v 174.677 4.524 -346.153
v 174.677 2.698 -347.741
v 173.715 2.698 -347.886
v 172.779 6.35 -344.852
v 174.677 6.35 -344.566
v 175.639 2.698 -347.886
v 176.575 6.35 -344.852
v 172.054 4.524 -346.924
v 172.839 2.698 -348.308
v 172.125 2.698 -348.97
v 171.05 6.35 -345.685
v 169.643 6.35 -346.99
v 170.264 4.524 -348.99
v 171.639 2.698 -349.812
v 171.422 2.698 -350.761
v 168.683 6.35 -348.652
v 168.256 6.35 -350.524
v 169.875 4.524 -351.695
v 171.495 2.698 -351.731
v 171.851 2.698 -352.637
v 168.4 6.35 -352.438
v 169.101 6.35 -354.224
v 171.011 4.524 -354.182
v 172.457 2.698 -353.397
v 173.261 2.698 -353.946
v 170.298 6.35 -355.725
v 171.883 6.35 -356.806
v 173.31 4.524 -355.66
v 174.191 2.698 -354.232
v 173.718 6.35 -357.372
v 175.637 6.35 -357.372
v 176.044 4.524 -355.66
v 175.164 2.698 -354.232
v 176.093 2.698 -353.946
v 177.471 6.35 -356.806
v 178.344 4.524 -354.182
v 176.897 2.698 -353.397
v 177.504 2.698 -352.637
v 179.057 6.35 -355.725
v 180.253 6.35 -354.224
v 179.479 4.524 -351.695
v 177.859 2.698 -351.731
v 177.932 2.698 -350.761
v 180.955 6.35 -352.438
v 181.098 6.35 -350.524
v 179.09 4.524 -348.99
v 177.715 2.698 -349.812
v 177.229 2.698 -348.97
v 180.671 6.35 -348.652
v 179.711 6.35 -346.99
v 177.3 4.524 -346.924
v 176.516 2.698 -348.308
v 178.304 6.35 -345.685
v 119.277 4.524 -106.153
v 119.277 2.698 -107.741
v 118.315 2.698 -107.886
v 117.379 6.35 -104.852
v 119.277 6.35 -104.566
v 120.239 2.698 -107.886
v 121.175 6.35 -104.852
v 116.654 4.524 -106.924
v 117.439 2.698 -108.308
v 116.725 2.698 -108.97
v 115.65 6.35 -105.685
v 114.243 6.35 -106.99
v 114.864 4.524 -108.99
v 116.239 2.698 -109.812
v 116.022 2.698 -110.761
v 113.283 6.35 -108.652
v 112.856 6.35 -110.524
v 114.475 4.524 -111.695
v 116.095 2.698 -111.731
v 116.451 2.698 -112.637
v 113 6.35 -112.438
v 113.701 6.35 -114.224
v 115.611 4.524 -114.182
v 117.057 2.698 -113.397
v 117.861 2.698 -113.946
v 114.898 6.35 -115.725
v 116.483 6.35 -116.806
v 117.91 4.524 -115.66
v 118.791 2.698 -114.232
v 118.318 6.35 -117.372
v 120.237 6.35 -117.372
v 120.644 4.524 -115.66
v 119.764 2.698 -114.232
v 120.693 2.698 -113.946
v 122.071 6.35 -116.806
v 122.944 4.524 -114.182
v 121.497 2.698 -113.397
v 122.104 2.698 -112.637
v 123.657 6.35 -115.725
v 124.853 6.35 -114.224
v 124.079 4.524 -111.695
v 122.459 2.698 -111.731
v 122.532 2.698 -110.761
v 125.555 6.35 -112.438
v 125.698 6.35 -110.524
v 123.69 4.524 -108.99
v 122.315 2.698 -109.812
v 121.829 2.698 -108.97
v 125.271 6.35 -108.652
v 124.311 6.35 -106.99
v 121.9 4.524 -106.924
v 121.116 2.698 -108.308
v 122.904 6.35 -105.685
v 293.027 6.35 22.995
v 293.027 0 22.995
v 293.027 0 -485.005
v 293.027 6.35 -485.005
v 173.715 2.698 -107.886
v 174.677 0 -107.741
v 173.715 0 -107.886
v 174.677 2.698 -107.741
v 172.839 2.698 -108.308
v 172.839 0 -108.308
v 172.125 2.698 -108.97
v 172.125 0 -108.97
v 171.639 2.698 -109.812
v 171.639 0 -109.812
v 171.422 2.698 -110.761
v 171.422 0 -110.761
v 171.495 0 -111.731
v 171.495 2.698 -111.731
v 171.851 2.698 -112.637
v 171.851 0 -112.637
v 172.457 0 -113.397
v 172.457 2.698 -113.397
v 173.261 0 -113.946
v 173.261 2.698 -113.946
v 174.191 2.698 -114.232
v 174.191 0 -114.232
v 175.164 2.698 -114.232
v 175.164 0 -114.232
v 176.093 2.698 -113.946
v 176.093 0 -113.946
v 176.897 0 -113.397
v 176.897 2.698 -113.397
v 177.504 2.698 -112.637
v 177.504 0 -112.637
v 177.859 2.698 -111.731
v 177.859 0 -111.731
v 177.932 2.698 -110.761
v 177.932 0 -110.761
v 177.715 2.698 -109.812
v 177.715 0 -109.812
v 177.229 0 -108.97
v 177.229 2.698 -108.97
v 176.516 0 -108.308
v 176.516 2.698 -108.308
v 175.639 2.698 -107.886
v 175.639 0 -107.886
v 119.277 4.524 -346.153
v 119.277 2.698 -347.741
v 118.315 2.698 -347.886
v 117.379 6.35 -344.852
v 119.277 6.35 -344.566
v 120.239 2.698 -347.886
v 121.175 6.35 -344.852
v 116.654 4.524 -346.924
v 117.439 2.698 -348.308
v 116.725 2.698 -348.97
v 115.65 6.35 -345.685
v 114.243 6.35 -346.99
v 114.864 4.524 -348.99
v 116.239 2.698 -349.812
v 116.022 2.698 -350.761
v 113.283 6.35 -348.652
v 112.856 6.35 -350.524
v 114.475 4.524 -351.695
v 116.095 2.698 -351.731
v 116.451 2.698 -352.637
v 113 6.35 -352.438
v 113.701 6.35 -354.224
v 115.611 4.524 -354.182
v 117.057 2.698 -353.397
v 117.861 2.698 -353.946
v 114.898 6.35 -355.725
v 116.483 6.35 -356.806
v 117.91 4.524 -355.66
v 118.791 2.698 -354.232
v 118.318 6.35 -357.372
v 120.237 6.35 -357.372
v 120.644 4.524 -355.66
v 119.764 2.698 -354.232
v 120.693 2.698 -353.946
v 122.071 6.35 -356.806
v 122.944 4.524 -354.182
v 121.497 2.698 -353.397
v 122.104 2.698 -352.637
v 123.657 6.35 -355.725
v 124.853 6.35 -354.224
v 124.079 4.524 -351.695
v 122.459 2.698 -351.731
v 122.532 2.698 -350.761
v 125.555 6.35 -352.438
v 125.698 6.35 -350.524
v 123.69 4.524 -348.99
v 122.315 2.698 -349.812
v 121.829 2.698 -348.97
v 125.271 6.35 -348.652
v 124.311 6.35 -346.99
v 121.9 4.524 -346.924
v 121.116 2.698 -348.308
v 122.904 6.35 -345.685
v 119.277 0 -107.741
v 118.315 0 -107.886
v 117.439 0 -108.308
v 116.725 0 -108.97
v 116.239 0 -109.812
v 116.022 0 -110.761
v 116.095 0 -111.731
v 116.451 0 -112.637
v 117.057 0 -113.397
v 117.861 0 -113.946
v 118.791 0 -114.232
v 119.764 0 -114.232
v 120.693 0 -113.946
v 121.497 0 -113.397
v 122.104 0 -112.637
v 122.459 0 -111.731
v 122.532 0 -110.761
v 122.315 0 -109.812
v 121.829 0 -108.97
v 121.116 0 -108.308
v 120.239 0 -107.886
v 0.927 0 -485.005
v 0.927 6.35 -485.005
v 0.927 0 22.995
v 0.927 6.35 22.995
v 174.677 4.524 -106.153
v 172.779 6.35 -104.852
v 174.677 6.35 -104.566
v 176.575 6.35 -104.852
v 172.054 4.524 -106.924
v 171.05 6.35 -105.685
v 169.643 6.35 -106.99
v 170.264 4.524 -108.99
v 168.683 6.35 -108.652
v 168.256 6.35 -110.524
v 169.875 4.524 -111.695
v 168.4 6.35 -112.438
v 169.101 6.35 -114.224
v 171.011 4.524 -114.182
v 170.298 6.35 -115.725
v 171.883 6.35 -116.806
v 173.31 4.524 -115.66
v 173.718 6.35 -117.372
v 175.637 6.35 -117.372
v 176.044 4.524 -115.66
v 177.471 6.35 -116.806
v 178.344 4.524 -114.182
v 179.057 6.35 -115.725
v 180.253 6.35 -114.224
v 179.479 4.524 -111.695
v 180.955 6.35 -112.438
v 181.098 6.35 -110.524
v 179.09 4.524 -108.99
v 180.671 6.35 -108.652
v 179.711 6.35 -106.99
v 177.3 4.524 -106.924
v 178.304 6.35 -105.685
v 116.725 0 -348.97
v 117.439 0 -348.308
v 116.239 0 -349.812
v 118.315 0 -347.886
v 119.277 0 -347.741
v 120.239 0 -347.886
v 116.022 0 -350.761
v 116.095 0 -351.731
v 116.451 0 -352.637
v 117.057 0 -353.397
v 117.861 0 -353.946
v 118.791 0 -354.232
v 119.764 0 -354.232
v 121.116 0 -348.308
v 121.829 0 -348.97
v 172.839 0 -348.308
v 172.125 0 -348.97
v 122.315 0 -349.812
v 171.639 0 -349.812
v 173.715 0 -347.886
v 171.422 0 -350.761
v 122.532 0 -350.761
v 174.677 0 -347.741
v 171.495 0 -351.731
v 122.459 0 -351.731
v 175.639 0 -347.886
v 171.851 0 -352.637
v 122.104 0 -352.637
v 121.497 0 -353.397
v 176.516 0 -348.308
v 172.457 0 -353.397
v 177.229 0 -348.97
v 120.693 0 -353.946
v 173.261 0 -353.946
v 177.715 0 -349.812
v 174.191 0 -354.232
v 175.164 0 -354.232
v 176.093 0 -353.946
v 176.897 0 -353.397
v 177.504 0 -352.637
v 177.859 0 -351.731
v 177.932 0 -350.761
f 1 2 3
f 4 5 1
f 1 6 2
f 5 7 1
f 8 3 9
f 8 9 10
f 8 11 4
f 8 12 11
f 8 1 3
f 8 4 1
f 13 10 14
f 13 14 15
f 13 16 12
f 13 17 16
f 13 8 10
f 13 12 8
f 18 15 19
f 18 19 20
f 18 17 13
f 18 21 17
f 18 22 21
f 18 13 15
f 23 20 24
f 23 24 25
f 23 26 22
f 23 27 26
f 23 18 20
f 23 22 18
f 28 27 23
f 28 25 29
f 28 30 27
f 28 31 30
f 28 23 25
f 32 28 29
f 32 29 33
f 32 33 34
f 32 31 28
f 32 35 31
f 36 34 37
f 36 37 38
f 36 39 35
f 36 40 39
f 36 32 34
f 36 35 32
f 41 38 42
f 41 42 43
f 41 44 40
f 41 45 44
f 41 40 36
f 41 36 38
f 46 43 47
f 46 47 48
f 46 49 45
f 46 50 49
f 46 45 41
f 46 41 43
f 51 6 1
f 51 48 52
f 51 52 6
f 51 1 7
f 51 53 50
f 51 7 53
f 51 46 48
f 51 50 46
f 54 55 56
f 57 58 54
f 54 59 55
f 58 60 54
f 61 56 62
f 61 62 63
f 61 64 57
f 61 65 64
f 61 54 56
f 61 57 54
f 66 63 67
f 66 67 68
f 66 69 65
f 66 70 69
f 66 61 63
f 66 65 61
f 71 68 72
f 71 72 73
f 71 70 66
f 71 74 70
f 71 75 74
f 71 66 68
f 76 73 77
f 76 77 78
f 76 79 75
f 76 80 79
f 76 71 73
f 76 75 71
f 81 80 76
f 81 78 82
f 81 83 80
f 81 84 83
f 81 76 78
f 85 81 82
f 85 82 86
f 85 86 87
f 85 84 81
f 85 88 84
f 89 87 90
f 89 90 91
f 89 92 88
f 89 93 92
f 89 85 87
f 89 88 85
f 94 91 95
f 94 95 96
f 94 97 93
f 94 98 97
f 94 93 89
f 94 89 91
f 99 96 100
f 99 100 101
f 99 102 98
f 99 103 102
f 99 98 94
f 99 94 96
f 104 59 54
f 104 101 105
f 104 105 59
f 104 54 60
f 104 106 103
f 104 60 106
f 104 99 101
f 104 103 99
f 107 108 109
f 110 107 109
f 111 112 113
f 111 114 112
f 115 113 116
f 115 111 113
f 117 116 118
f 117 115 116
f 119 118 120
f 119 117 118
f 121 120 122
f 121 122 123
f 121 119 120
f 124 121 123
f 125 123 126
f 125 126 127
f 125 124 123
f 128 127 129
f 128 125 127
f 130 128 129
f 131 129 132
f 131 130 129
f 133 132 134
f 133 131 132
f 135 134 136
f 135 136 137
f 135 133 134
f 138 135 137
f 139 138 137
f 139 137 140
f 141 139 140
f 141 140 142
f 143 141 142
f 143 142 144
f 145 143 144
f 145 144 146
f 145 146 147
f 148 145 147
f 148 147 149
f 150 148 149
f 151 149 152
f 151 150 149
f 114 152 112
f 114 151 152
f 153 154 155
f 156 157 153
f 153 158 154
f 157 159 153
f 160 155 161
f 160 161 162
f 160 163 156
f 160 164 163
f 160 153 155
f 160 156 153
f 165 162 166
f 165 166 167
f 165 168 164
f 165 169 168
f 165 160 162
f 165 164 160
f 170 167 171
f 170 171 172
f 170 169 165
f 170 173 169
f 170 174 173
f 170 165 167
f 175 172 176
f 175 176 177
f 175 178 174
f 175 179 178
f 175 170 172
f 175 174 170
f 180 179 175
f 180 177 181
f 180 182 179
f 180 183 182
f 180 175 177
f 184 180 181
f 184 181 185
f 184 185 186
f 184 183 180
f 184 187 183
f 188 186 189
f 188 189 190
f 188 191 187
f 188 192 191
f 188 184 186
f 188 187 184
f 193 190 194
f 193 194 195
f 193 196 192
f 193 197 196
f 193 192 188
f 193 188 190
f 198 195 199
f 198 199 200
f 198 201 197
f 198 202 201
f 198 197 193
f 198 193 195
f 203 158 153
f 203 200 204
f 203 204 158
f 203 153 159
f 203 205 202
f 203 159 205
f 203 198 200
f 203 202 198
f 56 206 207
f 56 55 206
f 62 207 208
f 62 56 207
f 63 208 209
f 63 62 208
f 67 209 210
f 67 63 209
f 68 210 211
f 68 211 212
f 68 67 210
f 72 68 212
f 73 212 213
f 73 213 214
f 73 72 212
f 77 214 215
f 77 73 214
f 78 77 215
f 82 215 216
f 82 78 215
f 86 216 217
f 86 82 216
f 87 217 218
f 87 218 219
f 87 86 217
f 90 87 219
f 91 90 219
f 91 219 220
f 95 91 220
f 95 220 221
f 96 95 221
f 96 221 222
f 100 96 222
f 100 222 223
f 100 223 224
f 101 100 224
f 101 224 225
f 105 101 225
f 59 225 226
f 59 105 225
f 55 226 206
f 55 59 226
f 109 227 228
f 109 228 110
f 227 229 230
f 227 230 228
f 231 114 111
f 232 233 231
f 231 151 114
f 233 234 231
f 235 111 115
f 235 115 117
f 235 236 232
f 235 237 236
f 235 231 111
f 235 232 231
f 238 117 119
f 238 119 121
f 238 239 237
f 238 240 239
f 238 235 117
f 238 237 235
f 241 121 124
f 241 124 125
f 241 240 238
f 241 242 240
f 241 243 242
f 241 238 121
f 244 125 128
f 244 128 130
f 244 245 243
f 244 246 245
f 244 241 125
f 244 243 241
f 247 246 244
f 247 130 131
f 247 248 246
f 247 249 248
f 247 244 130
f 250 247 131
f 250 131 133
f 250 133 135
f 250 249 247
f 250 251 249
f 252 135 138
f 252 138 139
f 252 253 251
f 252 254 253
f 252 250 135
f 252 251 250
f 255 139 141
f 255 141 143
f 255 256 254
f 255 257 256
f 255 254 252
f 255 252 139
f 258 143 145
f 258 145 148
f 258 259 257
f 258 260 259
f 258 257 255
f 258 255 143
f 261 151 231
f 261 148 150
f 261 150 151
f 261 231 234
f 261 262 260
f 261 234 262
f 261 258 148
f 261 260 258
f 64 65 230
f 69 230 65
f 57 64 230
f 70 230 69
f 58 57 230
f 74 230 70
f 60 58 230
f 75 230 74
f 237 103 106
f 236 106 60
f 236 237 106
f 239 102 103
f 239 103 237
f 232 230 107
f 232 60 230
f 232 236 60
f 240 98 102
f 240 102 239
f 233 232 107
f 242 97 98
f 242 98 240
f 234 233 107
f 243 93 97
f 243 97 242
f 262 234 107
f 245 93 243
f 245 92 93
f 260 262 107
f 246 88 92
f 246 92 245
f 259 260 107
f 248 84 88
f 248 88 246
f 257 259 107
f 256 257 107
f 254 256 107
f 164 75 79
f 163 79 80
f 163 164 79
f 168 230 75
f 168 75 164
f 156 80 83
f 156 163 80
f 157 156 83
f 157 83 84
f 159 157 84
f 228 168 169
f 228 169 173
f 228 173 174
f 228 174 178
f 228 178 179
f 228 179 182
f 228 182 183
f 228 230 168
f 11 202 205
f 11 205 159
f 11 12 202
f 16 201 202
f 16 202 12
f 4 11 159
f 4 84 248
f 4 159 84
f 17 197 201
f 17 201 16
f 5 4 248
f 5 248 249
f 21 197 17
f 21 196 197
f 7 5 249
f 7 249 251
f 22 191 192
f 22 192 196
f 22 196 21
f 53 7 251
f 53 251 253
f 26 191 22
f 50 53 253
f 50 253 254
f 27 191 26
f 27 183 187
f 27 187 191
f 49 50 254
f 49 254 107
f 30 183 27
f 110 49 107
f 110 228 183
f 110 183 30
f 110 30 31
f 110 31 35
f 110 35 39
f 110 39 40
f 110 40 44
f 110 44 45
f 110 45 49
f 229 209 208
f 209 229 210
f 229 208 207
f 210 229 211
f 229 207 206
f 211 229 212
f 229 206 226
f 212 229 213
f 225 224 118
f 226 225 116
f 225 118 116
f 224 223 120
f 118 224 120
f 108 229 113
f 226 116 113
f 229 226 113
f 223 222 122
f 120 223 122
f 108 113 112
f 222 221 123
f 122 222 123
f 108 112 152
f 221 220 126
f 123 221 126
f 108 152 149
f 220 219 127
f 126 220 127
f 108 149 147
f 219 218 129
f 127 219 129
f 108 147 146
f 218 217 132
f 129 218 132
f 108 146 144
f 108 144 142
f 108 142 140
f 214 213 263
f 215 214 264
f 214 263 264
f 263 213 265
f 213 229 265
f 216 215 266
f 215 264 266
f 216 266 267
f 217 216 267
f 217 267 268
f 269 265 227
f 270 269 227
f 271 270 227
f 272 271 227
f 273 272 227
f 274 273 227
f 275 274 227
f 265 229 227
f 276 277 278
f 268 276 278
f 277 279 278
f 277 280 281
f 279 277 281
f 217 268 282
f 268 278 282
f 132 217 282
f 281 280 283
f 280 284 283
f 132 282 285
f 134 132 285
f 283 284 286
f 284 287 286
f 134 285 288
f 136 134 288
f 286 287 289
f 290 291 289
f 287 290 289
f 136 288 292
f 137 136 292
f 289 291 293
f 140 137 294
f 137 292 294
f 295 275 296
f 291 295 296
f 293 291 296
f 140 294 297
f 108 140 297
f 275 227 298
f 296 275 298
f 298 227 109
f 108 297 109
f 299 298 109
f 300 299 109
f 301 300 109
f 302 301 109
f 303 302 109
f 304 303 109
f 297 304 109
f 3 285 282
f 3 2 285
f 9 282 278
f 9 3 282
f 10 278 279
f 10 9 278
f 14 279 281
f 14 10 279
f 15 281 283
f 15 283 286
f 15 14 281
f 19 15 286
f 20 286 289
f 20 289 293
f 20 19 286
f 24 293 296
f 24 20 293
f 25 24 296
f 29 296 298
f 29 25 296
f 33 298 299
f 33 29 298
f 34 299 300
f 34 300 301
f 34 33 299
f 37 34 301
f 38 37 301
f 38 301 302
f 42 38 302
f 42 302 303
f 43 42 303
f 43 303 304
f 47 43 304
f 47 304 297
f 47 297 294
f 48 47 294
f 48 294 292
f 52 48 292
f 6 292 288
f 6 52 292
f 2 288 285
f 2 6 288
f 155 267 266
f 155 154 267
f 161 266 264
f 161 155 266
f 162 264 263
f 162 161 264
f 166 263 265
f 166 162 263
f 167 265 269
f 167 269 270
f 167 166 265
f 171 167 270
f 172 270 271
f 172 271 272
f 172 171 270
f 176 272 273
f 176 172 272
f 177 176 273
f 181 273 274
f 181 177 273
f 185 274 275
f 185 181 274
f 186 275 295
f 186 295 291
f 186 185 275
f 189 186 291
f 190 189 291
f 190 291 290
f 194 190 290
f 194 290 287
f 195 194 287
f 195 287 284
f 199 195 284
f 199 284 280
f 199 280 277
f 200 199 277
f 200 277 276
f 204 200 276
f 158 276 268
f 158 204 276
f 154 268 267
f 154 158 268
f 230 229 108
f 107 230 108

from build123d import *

# Parameters (mm, degrees)
SKETCH1_W                                     = 292.1
SKETCH1_H                                     = 508
BOSS_EXTRUDE1_DEPTH                           = 6.35
CSK_FOR_1_4_FLAT_HEAD_MACHINE_SCREW1_AT_COUNT = 2
CSK_FOR_1_4_FLAT_HEAD_MACHINE_SCREW1_AT_PITCH = 55.4
CSK_FOR_1_4_FLAT_HEAD_MACHINE_SCREW1_2_COUNT  = 2
CSK_FOR_1_4_FLAT_HEAD_MACHINE_SCREW1_2_PITCH  = 246.311104094
CSK_FOR_1_4_FLAT_HEAD_MACHINE_SCREW1_3_COUNT  = 2
CSK_FOR_1_4_FLAT_HEAD_MACHINE_SCREW1_3_PITCH  = 240


with BuildPart() as part:
    # Sketch1 → Boss-Extrude1 (new body)
    with BuildSketch(Plane(origin=(0, 0, 0), x_dir=(1, 0, 0), z_dir=(0, 1, 0))):
        with Locations((146.977170591, 231.004856512)):
            Rectangle(SKETCH1_W, SKETCH1_H)
    extrude(amount=BOSS_EXTRUDE1_DEPTH)

    # Sketch6 → CSK for 1/4 Flat Head Machine Screw1 (revolve, cut)
    with BuildSketch(Plane(origin=(119.277170591, 6.35, -351.004856512), x_dir=(0, 0, 1), z_dir=(1, 0, 0))):
        Polygon((0, 0), (0, 6.35), (3.2639, 6.35), (3.2639, 3.652419693), (6.4389, 0), align=None)
    csk_for_1_4_flat_head_machine_screw1 = revolve(axis=Axis((119.277170591, 12.7, -351.004856512), (0, -1, 0)), mode=Mode.SUBTRACT)

    # CSK for 1/4 Flat Head Machine Screw1 at: CSK for 1/4 Flat Head Machine Screw1 ×2
    with Locations(*[(i * CSK_FOR_1_4_FLAT_HEAD_MACHINE_SCREW1_AT_PITCH, 0, 0) for i in range(1, CSK_FOR_1_4_FLAT_HEAD_MACHINE_SCREW1_AT_COUNT)]):
        add(csk_for_1_4_flat_head_machine_screw1, mode=Mode.SUBTRACT)

    # CSK for 1_4 Flat Head Machine Screw1 2: CSK for 1/4 Flat Head Machine Screw1 ×2
    with Locations(*[Vector(0.22491880828425845, 0, 0.9743775088126722) * (i * CSK_FOR_1_4_FLAT_HEAD_MACHINE_SCREW1_2_PITCH) for i in range(1, CSK_FOR_1_4_FLAT_HEAD_MACHINE_SCREW1_2_COUNT)]):
        add(csk_for_1_4_flat_head_machine_screw1, mode=Mode.SUBTRACT)

    # CSK for 1_4 Flat Head Machine Screw1 3: CSK for 1/4 Flat Head Machine Screw1 ×2
    with Locations(*[(0, 0, i * CSK_FOR_1_4_FLAT_HEAD_MACHINE_SCREW1_3_PITCH) for i in range(1, CSK_FOR_1_4_FLAT_HEAD_MACHINE_SCREW1_3_COUNT)]):
        add(csk_for_1_4_flat_head_machine_screw1, mode=Mode.SUBTRACT)


solid = part.part
